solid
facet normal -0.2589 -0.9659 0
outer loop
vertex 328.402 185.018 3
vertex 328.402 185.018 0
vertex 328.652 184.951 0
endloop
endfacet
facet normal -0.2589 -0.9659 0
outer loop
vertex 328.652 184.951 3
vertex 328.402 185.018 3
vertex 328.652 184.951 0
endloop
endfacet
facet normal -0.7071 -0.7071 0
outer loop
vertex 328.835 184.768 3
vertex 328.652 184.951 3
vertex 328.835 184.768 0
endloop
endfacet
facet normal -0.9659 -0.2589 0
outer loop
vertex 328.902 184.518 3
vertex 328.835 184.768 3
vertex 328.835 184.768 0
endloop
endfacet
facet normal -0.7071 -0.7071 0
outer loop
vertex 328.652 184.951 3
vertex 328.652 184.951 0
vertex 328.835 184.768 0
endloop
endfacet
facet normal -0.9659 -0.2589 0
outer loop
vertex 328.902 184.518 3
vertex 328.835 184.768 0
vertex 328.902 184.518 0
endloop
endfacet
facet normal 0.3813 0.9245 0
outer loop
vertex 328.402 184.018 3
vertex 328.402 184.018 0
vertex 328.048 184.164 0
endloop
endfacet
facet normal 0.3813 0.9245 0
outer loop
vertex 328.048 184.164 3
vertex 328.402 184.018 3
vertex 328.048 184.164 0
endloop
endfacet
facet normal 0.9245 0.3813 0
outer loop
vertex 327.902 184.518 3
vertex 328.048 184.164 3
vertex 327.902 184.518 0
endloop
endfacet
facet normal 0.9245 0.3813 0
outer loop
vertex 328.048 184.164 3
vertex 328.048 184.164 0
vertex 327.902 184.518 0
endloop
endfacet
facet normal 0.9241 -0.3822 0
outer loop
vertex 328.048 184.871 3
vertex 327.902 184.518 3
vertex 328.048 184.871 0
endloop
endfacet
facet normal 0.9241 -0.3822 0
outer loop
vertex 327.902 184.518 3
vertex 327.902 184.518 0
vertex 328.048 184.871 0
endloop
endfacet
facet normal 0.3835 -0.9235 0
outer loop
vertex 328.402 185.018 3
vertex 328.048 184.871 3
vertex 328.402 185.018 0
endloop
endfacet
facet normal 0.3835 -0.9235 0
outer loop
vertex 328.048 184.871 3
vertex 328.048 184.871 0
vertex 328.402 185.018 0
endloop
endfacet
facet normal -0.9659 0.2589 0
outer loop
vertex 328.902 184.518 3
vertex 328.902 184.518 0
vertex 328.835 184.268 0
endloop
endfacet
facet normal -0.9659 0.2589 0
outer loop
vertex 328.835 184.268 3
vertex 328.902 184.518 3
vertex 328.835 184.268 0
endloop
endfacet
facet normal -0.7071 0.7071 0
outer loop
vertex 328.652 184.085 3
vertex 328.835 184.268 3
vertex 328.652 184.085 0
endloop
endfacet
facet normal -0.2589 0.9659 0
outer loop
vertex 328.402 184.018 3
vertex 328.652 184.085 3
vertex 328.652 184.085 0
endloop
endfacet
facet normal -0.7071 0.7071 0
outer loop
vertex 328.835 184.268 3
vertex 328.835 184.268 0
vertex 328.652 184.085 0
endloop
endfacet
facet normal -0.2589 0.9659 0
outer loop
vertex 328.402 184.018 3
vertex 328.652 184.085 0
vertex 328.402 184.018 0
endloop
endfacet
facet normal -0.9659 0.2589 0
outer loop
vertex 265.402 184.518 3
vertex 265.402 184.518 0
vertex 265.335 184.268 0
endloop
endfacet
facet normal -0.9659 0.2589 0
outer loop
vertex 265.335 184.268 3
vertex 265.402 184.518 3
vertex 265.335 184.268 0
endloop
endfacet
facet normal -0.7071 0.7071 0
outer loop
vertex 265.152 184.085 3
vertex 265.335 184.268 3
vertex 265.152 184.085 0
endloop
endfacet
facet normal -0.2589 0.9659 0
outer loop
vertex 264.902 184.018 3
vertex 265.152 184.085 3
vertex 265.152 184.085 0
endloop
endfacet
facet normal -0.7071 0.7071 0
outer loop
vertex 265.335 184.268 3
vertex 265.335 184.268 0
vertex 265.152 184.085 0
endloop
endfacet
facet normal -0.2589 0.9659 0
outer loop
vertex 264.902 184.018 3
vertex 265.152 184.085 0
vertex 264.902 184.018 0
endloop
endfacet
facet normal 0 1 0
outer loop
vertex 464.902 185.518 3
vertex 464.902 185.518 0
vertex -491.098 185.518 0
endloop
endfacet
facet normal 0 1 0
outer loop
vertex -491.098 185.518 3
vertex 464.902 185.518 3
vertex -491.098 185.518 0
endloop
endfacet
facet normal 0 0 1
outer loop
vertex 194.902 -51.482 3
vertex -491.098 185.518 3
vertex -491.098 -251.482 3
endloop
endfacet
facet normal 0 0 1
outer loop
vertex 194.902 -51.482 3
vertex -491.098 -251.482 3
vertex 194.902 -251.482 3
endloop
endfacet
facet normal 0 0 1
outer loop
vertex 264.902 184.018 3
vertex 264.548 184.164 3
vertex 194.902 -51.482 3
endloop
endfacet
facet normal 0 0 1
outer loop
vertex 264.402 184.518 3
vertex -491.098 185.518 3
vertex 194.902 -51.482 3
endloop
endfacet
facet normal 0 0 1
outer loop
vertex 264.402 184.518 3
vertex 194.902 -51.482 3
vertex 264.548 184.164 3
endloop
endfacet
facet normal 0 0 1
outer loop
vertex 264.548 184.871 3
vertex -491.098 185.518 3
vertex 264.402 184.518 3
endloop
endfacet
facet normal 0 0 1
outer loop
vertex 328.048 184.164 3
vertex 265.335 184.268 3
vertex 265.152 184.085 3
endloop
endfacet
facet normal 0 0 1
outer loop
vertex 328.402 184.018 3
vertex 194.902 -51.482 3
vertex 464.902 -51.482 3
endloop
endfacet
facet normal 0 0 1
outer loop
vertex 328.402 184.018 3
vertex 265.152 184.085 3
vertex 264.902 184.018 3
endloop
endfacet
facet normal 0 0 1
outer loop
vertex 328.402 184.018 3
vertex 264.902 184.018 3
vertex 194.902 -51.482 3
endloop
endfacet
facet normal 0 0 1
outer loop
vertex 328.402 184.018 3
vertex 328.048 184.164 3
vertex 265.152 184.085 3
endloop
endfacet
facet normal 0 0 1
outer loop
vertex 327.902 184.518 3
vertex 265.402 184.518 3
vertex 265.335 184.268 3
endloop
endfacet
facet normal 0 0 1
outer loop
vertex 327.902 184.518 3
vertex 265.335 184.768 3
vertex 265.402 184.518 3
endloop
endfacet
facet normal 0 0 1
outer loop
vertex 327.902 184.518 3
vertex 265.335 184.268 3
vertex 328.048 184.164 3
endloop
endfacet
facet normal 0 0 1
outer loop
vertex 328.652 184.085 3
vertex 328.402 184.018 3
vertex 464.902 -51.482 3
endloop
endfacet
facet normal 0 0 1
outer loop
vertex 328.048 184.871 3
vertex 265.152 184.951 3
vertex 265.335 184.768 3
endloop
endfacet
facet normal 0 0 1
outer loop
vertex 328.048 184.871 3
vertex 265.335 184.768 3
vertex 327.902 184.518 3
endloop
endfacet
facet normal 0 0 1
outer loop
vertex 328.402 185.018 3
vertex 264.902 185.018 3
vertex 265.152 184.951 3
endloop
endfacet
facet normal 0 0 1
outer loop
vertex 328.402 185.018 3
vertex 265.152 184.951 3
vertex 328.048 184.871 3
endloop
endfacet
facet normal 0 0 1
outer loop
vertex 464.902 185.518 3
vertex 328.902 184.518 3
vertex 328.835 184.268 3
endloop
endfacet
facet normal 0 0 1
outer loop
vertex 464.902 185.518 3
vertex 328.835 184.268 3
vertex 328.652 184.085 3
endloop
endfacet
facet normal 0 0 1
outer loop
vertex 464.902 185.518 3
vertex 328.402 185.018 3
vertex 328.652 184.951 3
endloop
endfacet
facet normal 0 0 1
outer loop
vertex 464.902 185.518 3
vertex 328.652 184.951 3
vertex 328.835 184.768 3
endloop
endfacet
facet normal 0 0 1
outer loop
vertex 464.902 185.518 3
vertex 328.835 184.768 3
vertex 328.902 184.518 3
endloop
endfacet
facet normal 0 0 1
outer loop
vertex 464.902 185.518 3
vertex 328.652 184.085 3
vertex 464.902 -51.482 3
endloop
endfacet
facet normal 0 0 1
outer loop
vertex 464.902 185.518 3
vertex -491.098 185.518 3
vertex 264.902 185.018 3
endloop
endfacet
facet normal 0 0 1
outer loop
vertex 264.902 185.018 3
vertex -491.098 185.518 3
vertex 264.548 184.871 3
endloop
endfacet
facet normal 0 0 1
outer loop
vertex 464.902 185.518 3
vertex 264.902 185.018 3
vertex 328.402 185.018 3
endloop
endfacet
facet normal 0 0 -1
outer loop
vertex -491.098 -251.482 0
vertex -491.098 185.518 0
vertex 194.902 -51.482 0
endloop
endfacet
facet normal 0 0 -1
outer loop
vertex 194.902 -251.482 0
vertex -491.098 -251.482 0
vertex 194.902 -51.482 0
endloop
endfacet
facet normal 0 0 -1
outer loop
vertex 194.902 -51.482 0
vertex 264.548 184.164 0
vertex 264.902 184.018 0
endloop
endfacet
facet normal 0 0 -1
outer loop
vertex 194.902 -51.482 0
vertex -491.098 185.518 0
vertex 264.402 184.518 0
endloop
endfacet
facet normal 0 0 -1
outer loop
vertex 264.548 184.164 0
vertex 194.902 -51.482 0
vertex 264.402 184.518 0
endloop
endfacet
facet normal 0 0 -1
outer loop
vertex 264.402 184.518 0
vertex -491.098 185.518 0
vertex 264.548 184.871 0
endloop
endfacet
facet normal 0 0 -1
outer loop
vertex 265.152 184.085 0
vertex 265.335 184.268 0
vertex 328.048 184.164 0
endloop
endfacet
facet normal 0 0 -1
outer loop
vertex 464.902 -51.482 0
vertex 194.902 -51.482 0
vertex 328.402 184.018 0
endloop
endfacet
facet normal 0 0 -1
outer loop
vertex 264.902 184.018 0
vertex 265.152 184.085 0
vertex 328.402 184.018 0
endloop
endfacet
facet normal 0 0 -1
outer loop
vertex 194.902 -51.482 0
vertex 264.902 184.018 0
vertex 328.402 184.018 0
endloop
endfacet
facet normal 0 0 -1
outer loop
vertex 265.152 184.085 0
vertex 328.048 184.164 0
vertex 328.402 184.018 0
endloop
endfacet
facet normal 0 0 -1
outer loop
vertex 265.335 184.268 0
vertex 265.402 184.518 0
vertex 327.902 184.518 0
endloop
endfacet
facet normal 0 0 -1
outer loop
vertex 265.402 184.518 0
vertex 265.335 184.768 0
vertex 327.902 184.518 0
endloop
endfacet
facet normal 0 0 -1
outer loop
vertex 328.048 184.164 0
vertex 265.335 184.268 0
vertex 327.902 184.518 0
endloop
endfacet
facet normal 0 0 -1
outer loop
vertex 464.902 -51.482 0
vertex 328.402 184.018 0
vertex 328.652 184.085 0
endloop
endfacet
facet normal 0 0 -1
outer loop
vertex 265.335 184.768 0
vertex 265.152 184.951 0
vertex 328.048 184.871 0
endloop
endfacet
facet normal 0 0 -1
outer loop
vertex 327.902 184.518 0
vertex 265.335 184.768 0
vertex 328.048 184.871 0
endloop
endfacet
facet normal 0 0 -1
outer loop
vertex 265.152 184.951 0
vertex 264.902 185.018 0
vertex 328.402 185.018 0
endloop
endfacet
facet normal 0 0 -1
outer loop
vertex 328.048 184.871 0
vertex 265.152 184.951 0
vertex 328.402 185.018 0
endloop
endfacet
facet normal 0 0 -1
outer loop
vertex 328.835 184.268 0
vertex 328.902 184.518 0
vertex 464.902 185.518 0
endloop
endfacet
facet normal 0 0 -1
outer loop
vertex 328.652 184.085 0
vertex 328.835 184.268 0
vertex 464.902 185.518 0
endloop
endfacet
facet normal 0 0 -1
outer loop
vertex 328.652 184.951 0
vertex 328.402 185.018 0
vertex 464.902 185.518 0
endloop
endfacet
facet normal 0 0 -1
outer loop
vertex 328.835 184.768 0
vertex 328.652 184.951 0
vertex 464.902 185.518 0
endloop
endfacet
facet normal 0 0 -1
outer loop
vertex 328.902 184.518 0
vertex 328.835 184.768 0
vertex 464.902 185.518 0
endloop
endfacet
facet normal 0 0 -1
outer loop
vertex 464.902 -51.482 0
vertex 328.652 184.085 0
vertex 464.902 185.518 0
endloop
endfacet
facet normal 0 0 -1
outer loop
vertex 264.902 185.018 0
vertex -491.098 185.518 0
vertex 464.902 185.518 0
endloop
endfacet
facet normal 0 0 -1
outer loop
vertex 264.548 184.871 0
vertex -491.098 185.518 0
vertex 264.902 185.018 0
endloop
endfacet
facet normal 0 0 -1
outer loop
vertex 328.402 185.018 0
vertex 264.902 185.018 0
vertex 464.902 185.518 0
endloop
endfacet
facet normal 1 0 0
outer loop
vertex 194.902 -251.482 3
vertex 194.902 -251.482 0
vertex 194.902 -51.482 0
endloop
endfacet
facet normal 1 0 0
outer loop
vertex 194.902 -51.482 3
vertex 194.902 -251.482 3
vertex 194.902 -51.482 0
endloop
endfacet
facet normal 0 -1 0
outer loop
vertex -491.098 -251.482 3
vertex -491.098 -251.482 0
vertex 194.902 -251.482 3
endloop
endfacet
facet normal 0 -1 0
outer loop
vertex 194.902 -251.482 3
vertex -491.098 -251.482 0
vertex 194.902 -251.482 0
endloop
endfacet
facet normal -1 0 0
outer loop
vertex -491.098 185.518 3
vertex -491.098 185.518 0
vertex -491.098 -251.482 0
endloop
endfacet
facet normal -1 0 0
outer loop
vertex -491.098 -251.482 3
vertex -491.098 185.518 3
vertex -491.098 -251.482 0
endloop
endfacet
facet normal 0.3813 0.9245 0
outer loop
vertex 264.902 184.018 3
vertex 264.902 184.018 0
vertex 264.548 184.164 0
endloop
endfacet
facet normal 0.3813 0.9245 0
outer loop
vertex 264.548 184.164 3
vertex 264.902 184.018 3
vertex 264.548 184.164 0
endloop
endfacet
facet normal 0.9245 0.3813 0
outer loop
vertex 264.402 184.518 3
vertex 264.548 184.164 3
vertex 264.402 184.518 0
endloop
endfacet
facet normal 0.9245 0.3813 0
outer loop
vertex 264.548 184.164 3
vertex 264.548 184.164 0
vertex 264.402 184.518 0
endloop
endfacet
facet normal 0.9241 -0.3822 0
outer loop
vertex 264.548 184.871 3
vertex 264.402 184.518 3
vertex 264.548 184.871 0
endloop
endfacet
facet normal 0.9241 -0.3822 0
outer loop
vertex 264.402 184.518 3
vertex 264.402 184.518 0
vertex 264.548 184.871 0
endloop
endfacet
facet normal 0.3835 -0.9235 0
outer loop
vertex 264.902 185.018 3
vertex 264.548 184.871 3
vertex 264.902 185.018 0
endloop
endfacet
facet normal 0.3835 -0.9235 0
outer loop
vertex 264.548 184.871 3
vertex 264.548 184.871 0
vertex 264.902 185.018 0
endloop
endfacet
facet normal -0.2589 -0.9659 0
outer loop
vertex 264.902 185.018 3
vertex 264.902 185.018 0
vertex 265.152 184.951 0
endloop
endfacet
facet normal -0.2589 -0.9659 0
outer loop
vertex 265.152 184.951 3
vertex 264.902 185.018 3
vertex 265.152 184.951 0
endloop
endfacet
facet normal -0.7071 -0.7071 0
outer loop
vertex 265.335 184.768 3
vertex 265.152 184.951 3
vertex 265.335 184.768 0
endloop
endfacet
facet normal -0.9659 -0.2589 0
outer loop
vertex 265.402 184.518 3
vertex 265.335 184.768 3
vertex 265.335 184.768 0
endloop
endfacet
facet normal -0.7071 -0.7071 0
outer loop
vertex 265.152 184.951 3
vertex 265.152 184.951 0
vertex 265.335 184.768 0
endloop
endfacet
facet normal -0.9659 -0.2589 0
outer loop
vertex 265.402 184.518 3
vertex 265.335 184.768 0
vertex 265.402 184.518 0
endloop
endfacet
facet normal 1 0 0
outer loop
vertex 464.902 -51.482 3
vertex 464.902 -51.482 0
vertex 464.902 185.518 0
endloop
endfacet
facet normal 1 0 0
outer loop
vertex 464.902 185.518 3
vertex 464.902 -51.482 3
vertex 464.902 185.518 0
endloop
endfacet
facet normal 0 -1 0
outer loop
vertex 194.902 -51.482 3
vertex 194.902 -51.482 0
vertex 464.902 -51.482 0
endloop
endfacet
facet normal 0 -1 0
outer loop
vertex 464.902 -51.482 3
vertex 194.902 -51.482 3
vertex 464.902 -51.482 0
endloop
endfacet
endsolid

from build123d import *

# Parameters (mm, degrees)
F1_DEPTH = 3
F2_DEPTH = 25


with BuildPart() as f1:
    # F0 (on Top) → F1 (new body)
    with BuildSketch(Plane.XY):
        Polygon((201.401917, 185.517609), (-491.098083, 185.517609), (-491.098083, -251.482391), (194.901917, -251.482391), (194.901917, -51.482391), (464.901917, -51.482391), (464.901917, 185.517609), (328.401917, 185.517609), (264.901917, 185.517609), align=None)
        with BuildLine():
            ThreePointArc((264.901917, 184.017609), (264.401917, 184.517609), (264.901917, 185.017609))
            ThreePointArc((264.901917, 185.017609), (265.25547, 184.871162), (265.401917, 184.517609))
            ThreePointArc((265.401917, 184.517609), (265.25547, 184.164056), (264.901917, 184.017609))
        make_face(mode=Mode.SUBTRACT)
        with BuildLine():
            ThreePointArc((328.401917, 184.017609), (327.901917, 184.517609), (328.401917, 185.017609))
            ThreePointArc((328.401917, 185.017609), (328.75547, 184.871162), (328.901917, 184.517609))
            ThreePointArc((328.901917, 184.517609), (328.75547, 184.164056), (328.401917, 184.017609))
        make_face(mode=Mode.SUBTRACT)
    extrude(amount=F1_DEPTH)

    # F0 (on Top) → F2 (cut)
    with BuildSketch(Plane.XY):
        Polygon((201.401917, 185.517609), (-491.098083, 185.517609), (-491.098083, -251.482391), (194.901917, -251.482391), (194.901917, -51.482391), (464.901917, -51.482391), (464.901917, 185.517609), (328.401917, 185.517609), (264.901917, 185.517609), align=None)
        with BuildLine():
            ThreePointArc((264.901917, 184.017609), (264.401917, 184.517609), (264.901917, 185.017609))
            ThreePointArc((264.901917, 185.017609), (265.25547, 184.871162), (265.401917, 184.517609))
            ThreePointArc((265.401917, 184.517609), (265.25547, 184.164056), (264.901917, 184.017609))
        make_face(mode=Mode.SUBTRACT)
        with BuildLine():
            ThreePointArc((328.401917, 184.017609), (327.901917, 184.517609), (328.401917, 185.017609))
            ThreePointArc((328.401917, 185.017609), (328.75547, 184.871162), (328.901917, 184.517609))
            ThreePointArc((328.901917, 184.517609), (328.75547, 184.164056), (328.401917, 184.017609))
        make_face(mode=Mode.SUBTRACT)
    extrude(amount=-F2_DEPTH, mode=Mode.SUBTRACT)


solid = f1.part
